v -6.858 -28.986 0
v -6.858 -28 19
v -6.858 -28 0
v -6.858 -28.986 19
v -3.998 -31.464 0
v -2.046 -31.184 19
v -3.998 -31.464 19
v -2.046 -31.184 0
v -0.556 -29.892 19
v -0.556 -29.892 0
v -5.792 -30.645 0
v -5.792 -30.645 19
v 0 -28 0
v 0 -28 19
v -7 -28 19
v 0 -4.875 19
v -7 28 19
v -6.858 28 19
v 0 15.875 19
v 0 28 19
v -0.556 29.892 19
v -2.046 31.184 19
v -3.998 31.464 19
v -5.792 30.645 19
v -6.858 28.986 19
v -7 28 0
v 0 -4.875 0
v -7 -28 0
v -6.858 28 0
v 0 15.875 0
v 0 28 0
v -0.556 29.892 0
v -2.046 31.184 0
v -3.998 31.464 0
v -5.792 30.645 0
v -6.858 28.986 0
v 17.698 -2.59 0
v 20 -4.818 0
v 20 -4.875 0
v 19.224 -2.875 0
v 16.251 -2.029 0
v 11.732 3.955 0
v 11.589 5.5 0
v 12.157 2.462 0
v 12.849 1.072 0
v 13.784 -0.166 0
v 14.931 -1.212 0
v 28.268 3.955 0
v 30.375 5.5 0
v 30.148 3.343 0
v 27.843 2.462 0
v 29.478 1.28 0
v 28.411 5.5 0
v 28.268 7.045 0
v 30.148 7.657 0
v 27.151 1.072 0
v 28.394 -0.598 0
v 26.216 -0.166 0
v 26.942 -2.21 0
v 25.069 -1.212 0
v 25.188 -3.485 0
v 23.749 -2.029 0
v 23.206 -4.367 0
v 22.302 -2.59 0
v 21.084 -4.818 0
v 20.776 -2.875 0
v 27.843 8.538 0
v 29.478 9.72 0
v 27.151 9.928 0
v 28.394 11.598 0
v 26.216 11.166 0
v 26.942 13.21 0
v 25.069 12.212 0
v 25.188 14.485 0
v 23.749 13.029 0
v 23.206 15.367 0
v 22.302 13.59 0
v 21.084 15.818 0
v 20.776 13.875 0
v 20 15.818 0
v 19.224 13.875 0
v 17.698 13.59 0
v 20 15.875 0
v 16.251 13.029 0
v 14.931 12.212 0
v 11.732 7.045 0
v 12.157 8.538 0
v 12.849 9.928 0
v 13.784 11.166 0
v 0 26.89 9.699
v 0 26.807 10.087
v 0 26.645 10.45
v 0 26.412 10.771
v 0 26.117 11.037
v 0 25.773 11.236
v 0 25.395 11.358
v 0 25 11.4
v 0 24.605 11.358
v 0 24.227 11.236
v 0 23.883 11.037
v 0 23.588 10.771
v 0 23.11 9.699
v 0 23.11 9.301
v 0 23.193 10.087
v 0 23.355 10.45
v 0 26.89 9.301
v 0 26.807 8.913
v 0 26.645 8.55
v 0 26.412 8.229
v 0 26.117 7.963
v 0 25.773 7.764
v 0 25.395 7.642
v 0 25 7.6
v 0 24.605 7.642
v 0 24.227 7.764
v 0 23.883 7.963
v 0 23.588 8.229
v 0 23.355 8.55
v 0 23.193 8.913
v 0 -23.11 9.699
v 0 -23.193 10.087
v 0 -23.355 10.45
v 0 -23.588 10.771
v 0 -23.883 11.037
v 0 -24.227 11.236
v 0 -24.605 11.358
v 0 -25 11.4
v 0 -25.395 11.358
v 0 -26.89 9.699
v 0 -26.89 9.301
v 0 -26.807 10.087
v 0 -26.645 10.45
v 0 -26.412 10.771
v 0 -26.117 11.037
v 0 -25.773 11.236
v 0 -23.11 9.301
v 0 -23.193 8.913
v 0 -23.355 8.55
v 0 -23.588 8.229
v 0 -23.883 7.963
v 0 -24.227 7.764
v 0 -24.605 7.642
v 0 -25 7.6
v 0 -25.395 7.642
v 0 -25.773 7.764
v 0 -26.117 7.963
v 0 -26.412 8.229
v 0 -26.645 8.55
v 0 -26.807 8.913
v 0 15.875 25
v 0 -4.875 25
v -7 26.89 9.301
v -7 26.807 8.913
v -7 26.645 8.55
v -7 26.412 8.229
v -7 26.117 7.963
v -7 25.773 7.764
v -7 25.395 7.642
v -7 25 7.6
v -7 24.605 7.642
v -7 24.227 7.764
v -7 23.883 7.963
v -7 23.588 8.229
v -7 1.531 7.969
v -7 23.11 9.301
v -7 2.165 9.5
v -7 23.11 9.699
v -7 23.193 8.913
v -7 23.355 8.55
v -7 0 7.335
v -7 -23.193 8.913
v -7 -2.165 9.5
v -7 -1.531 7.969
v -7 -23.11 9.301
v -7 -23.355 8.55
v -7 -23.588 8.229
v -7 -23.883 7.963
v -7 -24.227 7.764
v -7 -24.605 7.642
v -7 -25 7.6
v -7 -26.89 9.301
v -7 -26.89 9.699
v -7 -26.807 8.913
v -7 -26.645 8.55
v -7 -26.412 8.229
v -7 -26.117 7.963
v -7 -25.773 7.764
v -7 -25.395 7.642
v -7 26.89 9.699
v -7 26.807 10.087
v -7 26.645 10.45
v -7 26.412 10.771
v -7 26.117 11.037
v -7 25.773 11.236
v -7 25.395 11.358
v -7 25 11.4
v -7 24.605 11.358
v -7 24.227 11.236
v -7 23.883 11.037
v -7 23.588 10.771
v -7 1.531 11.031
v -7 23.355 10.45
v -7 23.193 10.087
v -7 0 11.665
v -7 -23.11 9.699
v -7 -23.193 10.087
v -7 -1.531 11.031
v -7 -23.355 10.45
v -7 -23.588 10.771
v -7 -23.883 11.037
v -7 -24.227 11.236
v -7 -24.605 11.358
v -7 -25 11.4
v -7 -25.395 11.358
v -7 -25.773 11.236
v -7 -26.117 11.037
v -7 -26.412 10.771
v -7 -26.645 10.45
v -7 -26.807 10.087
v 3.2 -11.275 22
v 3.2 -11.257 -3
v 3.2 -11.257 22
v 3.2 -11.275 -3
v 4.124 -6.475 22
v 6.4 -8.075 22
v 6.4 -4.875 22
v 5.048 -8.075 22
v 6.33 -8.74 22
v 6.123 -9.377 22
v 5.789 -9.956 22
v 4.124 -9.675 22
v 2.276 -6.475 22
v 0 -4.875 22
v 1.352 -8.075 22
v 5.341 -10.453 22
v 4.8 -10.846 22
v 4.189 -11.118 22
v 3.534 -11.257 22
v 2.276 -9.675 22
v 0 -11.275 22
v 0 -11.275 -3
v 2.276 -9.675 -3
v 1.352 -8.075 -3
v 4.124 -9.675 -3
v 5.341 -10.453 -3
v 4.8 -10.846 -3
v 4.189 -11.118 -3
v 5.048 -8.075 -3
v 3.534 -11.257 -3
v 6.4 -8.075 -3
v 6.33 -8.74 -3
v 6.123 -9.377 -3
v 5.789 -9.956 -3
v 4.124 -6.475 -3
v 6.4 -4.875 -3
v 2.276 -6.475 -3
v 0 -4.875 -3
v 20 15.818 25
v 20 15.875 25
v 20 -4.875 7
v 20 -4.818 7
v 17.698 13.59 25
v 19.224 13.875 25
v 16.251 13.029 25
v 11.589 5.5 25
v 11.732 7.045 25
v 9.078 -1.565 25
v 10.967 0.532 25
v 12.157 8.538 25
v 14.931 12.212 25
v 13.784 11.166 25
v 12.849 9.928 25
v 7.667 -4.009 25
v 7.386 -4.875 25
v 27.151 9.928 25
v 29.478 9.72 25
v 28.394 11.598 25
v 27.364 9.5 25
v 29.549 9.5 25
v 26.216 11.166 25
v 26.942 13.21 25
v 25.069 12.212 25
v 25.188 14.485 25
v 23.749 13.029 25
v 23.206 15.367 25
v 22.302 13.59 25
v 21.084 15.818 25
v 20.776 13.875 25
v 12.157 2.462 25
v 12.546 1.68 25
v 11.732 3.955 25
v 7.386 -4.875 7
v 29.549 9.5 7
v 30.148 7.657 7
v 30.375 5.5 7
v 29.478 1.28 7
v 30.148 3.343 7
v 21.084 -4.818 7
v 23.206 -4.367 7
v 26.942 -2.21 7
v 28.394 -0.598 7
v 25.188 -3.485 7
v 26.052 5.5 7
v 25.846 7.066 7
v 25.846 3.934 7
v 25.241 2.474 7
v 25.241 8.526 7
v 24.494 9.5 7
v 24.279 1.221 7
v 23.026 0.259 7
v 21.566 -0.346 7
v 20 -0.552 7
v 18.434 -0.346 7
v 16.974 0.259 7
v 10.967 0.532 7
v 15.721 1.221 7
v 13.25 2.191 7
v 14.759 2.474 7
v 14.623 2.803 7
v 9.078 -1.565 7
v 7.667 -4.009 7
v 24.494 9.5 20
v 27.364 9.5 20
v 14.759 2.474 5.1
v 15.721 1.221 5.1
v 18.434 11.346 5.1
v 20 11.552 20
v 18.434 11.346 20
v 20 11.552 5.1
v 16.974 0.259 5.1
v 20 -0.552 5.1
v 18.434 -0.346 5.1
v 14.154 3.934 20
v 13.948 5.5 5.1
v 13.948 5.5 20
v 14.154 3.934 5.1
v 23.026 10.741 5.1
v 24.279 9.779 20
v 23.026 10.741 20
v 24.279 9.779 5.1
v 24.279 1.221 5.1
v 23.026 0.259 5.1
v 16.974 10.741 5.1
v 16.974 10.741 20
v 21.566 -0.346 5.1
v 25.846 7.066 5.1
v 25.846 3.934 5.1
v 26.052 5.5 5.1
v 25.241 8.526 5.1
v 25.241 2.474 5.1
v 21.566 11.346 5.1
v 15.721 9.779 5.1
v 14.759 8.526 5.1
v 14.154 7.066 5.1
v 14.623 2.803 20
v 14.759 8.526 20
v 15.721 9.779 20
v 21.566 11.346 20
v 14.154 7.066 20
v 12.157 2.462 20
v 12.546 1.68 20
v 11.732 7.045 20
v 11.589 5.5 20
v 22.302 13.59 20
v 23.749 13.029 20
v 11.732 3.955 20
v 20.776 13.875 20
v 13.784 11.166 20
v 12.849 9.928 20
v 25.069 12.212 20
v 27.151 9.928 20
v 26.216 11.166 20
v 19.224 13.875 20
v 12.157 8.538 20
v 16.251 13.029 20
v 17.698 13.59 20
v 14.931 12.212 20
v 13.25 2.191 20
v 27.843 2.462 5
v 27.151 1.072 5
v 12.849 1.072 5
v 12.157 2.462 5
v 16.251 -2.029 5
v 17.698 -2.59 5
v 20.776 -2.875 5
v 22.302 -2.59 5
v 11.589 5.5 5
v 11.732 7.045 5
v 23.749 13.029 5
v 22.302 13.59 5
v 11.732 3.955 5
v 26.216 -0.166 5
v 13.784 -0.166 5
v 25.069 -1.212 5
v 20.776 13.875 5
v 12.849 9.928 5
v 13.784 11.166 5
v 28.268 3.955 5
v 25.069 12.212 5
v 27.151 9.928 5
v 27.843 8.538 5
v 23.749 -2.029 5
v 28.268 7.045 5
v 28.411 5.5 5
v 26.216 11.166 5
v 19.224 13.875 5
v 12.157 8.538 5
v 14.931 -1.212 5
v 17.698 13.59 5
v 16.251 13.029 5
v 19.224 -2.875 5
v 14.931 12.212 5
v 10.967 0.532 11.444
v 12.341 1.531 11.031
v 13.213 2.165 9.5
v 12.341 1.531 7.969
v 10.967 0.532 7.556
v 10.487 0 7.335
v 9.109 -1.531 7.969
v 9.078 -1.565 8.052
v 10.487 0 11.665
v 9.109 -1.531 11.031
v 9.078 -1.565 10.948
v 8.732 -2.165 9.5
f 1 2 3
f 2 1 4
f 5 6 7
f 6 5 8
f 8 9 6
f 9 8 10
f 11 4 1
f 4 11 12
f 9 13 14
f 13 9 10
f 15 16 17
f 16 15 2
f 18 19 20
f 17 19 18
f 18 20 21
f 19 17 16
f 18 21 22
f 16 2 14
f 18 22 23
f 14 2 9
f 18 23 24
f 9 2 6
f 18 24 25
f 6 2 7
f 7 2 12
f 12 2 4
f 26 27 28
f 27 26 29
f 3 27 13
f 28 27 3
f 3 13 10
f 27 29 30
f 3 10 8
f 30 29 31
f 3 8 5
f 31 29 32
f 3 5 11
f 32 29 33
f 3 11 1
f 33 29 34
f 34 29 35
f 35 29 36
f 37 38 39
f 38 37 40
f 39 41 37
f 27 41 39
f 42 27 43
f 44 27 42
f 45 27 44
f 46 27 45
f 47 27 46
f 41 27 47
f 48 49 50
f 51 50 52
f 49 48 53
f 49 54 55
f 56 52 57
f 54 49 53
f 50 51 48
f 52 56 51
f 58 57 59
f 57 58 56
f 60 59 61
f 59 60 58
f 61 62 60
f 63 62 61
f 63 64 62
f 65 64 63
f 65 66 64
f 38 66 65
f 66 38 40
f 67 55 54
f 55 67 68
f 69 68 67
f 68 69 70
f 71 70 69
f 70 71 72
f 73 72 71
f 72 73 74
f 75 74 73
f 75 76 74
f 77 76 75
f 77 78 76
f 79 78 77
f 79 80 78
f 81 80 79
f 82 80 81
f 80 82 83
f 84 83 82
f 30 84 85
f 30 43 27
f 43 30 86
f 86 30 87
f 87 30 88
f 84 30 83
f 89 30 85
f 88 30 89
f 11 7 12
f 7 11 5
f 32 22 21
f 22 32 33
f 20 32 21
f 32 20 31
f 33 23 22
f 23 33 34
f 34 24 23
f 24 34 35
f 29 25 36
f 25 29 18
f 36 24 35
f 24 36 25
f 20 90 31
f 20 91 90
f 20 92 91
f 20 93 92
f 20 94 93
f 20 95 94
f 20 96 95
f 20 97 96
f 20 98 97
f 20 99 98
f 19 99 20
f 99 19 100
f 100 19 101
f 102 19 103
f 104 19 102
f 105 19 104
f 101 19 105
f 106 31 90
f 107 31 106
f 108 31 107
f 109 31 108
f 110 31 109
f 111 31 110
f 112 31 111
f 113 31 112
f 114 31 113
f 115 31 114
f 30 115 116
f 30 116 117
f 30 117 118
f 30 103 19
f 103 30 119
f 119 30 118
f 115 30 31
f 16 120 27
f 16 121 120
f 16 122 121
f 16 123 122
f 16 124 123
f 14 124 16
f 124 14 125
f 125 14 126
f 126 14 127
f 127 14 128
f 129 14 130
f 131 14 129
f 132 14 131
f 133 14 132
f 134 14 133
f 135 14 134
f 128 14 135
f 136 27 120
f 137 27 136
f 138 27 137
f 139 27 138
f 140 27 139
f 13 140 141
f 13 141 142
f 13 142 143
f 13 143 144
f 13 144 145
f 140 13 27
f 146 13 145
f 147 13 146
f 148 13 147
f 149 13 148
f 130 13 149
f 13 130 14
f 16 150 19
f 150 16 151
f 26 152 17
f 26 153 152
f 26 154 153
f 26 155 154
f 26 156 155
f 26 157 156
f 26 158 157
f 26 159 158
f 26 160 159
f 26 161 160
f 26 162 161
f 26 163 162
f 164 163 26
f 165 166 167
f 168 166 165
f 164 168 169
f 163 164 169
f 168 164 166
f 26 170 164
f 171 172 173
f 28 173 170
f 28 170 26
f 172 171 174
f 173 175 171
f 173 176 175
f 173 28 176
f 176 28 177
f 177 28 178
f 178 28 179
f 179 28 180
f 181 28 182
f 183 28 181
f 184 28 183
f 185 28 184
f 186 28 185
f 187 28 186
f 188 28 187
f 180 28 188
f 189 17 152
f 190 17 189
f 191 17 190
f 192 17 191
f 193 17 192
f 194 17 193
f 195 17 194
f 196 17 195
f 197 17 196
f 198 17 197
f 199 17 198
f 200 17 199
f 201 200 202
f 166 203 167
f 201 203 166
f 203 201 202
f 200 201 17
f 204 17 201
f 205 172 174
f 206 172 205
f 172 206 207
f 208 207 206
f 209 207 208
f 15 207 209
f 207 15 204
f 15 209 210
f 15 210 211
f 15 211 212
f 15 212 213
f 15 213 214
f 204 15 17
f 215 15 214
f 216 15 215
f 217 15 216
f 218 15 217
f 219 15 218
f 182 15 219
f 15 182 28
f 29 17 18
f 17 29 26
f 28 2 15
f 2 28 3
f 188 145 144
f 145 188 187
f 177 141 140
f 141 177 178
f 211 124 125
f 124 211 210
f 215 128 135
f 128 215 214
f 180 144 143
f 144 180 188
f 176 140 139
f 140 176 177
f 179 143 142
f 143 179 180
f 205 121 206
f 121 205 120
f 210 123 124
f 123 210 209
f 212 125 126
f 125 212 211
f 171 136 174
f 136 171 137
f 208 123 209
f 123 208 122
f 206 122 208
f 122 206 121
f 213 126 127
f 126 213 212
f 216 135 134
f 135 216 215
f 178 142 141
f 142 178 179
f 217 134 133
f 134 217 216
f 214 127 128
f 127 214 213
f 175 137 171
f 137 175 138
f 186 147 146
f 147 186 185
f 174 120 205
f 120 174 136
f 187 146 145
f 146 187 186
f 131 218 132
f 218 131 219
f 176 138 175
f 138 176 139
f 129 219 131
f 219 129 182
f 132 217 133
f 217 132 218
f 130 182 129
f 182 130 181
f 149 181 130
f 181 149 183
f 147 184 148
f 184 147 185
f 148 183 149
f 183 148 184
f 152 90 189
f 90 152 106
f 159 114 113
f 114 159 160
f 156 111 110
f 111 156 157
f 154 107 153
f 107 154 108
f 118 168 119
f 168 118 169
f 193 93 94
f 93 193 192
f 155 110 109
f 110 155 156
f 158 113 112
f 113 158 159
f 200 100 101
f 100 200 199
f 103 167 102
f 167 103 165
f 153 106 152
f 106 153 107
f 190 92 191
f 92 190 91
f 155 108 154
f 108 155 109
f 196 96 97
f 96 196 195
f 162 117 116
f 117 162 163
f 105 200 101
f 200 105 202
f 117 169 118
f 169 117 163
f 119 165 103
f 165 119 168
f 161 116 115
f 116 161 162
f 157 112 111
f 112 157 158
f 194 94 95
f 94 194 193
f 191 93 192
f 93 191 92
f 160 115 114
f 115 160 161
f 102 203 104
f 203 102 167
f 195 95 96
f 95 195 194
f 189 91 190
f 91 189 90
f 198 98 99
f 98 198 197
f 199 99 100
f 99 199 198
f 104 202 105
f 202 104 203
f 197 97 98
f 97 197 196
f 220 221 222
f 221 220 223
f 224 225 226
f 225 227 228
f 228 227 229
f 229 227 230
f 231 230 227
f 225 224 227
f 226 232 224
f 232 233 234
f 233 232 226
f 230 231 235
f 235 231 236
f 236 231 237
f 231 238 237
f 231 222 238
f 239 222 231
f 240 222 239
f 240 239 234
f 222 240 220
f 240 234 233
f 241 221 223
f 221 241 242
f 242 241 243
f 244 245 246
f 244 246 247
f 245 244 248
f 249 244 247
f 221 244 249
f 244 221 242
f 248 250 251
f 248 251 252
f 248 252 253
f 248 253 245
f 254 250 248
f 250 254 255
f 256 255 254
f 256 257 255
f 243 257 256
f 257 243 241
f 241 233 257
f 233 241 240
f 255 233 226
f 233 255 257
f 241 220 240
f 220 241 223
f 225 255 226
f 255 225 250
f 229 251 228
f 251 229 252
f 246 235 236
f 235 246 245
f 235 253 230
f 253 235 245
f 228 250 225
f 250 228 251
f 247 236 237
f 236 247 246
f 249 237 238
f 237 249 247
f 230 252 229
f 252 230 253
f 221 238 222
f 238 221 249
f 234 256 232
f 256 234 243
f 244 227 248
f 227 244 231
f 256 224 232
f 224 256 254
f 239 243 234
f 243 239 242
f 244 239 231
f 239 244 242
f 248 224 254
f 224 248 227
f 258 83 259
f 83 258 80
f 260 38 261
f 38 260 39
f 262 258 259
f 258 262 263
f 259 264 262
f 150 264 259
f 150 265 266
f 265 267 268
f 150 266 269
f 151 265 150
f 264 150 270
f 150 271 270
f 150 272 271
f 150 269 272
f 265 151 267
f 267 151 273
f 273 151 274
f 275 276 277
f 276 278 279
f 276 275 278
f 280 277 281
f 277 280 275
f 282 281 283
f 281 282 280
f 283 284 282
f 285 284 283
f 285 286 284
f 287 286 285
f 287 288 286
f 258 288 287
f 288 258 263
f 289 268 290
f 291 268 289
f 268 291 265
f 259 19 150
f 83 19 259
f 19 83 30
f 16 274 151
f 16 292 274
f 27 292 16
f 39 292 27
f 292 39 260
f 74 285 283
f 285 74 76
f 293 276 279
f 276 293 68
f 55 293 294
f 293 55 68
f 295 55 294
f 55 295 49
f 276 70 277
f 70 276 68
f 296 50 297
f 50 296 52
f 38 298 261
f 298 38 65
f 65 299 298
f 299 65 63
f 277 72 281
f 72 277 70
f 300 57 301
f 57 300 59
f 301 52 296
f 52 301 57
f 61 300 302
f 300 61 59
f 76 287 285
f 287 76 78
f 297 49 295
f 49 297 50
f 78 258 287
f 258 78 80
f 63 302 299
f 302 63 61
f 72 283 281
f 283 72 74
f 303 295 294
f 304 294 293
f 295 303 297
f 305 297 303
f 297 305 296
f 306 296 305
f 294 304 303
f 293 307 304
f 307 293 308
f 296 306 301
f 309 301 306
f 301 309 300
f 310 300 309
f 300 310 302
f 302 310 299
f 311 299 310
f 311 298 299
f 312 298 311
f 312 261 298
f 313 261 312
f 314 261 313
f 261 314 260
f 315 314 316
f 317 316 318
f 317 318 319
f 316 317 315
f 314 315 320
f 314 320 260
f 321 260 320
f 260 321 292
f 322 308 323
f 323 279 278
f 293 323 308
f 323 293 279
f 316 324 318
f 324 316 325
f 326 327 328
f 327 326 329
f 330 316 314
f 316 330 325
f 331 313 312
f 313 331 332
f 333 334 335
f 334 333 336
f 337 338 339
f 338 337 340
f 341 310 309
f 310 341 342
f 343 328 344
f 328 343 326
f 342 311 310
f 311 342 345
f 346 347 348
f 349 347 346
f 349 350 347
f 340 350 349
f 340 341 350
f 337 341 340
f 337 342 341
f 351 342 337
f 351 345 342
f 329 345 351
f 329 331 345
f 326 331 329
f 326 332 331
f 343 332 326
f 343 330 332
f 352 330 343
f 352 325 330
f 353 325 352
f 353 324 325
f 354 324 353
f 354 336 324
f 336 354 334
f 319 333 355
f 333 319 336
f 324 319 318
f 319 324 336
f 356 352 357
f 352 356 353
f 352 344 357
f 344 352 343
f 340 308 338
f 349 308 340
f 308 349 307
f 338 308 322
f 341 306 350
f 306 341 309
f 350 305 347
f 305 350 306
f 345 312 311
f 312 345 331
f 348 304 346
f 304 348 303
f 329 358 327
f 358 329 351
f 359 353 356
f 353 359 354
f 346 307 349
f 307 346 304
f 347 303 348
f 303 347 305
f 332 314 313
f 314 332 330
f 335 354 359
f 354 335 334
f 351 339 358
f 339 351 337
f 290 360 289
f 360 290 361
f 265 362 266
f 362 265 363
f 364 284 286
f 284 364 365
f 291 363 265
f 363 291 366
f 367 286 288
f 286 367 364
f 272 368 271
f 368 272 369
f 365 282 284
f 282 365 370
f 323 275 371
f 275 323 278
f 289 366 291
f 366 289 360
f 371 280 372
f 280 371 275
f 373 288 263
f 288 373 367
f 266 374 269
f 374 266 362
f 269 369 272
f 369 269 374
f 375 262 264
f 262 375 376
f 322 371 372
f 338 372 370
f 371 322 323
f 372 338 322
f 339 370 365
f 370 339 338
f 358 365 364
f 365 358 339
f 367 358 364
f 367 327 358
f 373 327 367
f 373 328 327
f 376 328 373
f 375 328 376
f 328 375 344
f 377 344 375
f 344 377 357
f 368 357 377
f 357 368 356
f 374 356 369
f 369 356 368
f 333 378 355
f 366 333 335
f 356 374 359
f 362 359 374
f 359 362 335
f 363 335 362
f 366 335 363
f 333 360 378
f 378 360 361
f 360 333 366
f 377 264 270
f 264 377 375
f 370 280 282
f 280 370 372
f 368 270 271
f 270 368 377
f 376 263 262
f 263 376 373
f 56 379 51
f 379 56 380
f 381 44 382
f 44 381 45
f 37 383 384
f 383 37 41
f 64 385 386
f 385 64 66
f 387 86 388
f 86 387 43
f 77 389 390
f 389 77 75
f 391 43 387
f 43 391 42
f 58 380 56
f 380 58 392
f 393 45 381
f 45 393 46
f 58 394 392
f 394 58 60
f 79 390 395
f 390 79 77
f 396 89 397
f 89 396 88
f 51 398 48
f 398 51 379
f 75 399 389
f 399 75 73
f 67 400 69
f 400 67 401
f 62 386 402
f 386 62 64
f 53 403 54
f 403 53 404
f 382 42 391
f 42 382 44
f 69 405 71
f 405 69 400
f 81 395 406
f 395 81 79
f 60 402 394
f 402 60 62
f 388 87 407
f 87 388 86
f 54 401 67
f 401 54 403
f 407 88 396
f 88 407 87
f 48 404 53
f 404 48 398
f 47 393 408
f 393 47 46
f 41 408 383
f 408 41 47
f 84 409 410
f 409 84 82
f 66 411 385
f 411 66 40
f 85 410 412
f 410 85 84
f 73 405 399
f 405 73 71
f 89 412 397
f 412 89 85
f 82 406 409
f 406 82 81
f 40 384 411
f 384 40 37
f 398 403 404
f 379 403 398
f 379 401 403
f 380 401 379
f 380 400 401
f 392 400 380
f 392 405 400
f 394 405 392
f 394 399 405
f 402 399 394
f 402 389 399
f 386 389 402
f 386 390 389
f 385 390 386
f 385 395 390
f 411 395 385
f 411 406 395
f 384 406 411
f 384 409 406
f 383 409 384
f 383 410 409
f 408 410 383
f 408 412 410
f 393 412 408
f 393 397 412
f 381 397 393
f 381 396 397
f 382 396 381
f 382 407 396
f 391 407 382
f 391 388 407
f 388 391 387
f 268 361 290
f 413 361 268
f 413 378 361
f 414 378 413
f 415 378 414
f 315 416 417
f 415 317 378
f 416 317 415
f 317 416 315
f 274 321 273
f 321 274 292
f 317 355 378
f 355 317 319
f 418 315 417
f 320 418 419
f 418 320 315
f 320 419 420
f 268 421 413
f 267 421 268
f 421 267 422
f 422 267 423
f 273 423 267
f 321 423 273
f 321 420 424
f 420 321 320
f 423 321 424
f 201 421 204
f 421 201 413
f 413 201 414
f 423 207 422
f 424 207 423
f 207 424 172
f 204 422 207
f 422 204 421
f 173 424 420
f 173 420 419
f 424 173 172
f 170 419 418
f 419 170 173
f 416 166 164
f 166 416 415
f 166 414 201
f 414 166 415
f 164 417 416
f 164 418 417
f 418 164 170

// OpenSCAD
// file: stuff.scad
nema14_width=1.4*25.4;
nema14_hole_spacing=nema14_width/sqrt(2);
m4_nut_diameter=9;
m4_taphole_diameter=3.8;

bignumber=100;

module hole(h,d,r=false,center=false){
    r=(r==false)?(d/2):r;
    cylinder(h=h,r=r,center=center,$fs=0.2);
}
module polyhole(h,d,r=false,center=false){
    r=(r==false)?(d/2):r;
    n=max(round(4*r),3);
    rotate([0,0,180])cylinder(h=h,r=r/cos(180/n),$fn=n,center=center);
}
// main file
//An extruder inspired by Greg's Hinged Extruder.
//Designed to be awesome.

include <stuff.scad>;

membrane=.1;

taphole=true;
mountinghole_distance=25;

hinge_bolt=3.2;

filament_diameter=3;
filament_diameter_hole=4;

big_gear_pitch_radius=80*0.25;
small_gear_pitch_radius=14*0.25;

drive_pitch_radius=8/2;
drive_diameter=12;
drive_offset=0;
drive_length=5;
drive_shaft_diameter=4;
drive_spacing=13-5;

z_offset=big_gear_pitch_radius+0; //

bearing_diameter=16.75;
bearing_thickness=5;
bearing_sidewall=2;
bearing_topwall=2;
bearing_thickness_total=bearing_thickness+bearing_topwall;

idler_bearing_diameter=22;
idler_bearing_clearance=5;
idler_bearing_thickness=9;

base_thickness=7;
base_length=70;
base_leadout=25;
base_cubelength=base_length-(base_thickness*2);

drivestack_length=bearing_thickness_total+drive_offset+drive_length+drive_spacing+bearing_thickness;
filament_position=bearing_thickness_total+drive_offset+(drive_length/2);
base_width=filament_position*2;

module base(){
	difference(){
		union(){
			translate([0,-base_cubelength/2,0])
				cube([base_thickness,base_cubelength,base_width]);
			for(i=[-1,1]) translate([base_thickness/2,i*base_cubelength/2,0])
				cylinder(r=base_thickness/2,h=base_width);
		}
		for(i=[-1,1]) translate([base_thickness/2,i*mountinghole_distance,filament_position]) rotate([0,90,0]){
			if(taphole){
				hole(d=m4_taphole_diameter,h=bignumber,center=true);
			}
			else{
				cylinder(r=m4_nut_diameter/2,h=base_thickness,$fn=6);
				hole(d=4,h=bignumber,center=true);
			}
		}
	}
}

module body(){
	translate([z_offset,drive_pitch_radius+filament_diameter/2,0])
	difference(){
		union(){
			translate([-z_offset,-bearing_diameter/2-bearing_sidewall,0]) //main block
				cube([z_offset,
					bearing_diameter+2*bearing_sidewall,
					drivestack_length]);
			cylinder(r=bearing_diameter/2+bearing_sidewall,h=drivestack_length);
			
			//hinge
			translate([-z_offset+hinge_bolt,
				-bearing_diameter/2-bearing_sidewall-hinge_bolt,
				filament_position
			]) difference(){
				union(){
					translate([-hinge_bolt/2,0,0])
						cube([hinge_bolt,hinge_bolt*2,drivestack_length],center=true);
					translate([0,hinge_bolt/2,0])
						cube([hinge_bolt*2,hinge_bolt,drivestack_length],center=true);
					hole(r=hinge_bolt,h=drivestack_length,center=true);
				}
				polyhole(d=hinge_bolt,h=drivestack_length*3,center=true);
			}
		}
		union(){
			polyhole(d=bearing_diameter,h=bearing_thickness*2,center=true); // bearing no 1
			translate([0,0,bearing_thickness_total]){
				translate([-drive_pitch_radius,drive_pitch_radius,0]) mirror([0,1,0])
					cube([bearing_diameter,bearing_diameter,bignumber]);
				translate([0,0,-bearing_topwall+membrane])
					polyhole(d=drive_diameter,h=bignumber);
				translate([0,0,drive_length+drive_offset+drive_spacing])
					polyhole(d=bearing_diameter,h=bignumber); // bearing no 2
			}
			// idler bearing space
			translate([0,-idler_bearing_diameter/2-drive_pitch_radius,bearing_thickness_total])
				hole(d=idler_bearing_diameter+idler_bearing_clearance,h=bignumber);
			%union(){
				translate([0,0,drive_offset+bearing_thickness_total])
					hole(r=drive_pitch_radius,h=drive_length);
				hole(d=drive_shaft_diameter,h=bignumber);
			}
		}
	}
}

difference(){
	union(){
		translate([-base_thickness,0,0]) base();
		body();
	}
#	translate([0,0,filament_position]) rotate([0,90,0]) polyhole(d=filament_diameter_hole,h=bignumber,center=true);
}
